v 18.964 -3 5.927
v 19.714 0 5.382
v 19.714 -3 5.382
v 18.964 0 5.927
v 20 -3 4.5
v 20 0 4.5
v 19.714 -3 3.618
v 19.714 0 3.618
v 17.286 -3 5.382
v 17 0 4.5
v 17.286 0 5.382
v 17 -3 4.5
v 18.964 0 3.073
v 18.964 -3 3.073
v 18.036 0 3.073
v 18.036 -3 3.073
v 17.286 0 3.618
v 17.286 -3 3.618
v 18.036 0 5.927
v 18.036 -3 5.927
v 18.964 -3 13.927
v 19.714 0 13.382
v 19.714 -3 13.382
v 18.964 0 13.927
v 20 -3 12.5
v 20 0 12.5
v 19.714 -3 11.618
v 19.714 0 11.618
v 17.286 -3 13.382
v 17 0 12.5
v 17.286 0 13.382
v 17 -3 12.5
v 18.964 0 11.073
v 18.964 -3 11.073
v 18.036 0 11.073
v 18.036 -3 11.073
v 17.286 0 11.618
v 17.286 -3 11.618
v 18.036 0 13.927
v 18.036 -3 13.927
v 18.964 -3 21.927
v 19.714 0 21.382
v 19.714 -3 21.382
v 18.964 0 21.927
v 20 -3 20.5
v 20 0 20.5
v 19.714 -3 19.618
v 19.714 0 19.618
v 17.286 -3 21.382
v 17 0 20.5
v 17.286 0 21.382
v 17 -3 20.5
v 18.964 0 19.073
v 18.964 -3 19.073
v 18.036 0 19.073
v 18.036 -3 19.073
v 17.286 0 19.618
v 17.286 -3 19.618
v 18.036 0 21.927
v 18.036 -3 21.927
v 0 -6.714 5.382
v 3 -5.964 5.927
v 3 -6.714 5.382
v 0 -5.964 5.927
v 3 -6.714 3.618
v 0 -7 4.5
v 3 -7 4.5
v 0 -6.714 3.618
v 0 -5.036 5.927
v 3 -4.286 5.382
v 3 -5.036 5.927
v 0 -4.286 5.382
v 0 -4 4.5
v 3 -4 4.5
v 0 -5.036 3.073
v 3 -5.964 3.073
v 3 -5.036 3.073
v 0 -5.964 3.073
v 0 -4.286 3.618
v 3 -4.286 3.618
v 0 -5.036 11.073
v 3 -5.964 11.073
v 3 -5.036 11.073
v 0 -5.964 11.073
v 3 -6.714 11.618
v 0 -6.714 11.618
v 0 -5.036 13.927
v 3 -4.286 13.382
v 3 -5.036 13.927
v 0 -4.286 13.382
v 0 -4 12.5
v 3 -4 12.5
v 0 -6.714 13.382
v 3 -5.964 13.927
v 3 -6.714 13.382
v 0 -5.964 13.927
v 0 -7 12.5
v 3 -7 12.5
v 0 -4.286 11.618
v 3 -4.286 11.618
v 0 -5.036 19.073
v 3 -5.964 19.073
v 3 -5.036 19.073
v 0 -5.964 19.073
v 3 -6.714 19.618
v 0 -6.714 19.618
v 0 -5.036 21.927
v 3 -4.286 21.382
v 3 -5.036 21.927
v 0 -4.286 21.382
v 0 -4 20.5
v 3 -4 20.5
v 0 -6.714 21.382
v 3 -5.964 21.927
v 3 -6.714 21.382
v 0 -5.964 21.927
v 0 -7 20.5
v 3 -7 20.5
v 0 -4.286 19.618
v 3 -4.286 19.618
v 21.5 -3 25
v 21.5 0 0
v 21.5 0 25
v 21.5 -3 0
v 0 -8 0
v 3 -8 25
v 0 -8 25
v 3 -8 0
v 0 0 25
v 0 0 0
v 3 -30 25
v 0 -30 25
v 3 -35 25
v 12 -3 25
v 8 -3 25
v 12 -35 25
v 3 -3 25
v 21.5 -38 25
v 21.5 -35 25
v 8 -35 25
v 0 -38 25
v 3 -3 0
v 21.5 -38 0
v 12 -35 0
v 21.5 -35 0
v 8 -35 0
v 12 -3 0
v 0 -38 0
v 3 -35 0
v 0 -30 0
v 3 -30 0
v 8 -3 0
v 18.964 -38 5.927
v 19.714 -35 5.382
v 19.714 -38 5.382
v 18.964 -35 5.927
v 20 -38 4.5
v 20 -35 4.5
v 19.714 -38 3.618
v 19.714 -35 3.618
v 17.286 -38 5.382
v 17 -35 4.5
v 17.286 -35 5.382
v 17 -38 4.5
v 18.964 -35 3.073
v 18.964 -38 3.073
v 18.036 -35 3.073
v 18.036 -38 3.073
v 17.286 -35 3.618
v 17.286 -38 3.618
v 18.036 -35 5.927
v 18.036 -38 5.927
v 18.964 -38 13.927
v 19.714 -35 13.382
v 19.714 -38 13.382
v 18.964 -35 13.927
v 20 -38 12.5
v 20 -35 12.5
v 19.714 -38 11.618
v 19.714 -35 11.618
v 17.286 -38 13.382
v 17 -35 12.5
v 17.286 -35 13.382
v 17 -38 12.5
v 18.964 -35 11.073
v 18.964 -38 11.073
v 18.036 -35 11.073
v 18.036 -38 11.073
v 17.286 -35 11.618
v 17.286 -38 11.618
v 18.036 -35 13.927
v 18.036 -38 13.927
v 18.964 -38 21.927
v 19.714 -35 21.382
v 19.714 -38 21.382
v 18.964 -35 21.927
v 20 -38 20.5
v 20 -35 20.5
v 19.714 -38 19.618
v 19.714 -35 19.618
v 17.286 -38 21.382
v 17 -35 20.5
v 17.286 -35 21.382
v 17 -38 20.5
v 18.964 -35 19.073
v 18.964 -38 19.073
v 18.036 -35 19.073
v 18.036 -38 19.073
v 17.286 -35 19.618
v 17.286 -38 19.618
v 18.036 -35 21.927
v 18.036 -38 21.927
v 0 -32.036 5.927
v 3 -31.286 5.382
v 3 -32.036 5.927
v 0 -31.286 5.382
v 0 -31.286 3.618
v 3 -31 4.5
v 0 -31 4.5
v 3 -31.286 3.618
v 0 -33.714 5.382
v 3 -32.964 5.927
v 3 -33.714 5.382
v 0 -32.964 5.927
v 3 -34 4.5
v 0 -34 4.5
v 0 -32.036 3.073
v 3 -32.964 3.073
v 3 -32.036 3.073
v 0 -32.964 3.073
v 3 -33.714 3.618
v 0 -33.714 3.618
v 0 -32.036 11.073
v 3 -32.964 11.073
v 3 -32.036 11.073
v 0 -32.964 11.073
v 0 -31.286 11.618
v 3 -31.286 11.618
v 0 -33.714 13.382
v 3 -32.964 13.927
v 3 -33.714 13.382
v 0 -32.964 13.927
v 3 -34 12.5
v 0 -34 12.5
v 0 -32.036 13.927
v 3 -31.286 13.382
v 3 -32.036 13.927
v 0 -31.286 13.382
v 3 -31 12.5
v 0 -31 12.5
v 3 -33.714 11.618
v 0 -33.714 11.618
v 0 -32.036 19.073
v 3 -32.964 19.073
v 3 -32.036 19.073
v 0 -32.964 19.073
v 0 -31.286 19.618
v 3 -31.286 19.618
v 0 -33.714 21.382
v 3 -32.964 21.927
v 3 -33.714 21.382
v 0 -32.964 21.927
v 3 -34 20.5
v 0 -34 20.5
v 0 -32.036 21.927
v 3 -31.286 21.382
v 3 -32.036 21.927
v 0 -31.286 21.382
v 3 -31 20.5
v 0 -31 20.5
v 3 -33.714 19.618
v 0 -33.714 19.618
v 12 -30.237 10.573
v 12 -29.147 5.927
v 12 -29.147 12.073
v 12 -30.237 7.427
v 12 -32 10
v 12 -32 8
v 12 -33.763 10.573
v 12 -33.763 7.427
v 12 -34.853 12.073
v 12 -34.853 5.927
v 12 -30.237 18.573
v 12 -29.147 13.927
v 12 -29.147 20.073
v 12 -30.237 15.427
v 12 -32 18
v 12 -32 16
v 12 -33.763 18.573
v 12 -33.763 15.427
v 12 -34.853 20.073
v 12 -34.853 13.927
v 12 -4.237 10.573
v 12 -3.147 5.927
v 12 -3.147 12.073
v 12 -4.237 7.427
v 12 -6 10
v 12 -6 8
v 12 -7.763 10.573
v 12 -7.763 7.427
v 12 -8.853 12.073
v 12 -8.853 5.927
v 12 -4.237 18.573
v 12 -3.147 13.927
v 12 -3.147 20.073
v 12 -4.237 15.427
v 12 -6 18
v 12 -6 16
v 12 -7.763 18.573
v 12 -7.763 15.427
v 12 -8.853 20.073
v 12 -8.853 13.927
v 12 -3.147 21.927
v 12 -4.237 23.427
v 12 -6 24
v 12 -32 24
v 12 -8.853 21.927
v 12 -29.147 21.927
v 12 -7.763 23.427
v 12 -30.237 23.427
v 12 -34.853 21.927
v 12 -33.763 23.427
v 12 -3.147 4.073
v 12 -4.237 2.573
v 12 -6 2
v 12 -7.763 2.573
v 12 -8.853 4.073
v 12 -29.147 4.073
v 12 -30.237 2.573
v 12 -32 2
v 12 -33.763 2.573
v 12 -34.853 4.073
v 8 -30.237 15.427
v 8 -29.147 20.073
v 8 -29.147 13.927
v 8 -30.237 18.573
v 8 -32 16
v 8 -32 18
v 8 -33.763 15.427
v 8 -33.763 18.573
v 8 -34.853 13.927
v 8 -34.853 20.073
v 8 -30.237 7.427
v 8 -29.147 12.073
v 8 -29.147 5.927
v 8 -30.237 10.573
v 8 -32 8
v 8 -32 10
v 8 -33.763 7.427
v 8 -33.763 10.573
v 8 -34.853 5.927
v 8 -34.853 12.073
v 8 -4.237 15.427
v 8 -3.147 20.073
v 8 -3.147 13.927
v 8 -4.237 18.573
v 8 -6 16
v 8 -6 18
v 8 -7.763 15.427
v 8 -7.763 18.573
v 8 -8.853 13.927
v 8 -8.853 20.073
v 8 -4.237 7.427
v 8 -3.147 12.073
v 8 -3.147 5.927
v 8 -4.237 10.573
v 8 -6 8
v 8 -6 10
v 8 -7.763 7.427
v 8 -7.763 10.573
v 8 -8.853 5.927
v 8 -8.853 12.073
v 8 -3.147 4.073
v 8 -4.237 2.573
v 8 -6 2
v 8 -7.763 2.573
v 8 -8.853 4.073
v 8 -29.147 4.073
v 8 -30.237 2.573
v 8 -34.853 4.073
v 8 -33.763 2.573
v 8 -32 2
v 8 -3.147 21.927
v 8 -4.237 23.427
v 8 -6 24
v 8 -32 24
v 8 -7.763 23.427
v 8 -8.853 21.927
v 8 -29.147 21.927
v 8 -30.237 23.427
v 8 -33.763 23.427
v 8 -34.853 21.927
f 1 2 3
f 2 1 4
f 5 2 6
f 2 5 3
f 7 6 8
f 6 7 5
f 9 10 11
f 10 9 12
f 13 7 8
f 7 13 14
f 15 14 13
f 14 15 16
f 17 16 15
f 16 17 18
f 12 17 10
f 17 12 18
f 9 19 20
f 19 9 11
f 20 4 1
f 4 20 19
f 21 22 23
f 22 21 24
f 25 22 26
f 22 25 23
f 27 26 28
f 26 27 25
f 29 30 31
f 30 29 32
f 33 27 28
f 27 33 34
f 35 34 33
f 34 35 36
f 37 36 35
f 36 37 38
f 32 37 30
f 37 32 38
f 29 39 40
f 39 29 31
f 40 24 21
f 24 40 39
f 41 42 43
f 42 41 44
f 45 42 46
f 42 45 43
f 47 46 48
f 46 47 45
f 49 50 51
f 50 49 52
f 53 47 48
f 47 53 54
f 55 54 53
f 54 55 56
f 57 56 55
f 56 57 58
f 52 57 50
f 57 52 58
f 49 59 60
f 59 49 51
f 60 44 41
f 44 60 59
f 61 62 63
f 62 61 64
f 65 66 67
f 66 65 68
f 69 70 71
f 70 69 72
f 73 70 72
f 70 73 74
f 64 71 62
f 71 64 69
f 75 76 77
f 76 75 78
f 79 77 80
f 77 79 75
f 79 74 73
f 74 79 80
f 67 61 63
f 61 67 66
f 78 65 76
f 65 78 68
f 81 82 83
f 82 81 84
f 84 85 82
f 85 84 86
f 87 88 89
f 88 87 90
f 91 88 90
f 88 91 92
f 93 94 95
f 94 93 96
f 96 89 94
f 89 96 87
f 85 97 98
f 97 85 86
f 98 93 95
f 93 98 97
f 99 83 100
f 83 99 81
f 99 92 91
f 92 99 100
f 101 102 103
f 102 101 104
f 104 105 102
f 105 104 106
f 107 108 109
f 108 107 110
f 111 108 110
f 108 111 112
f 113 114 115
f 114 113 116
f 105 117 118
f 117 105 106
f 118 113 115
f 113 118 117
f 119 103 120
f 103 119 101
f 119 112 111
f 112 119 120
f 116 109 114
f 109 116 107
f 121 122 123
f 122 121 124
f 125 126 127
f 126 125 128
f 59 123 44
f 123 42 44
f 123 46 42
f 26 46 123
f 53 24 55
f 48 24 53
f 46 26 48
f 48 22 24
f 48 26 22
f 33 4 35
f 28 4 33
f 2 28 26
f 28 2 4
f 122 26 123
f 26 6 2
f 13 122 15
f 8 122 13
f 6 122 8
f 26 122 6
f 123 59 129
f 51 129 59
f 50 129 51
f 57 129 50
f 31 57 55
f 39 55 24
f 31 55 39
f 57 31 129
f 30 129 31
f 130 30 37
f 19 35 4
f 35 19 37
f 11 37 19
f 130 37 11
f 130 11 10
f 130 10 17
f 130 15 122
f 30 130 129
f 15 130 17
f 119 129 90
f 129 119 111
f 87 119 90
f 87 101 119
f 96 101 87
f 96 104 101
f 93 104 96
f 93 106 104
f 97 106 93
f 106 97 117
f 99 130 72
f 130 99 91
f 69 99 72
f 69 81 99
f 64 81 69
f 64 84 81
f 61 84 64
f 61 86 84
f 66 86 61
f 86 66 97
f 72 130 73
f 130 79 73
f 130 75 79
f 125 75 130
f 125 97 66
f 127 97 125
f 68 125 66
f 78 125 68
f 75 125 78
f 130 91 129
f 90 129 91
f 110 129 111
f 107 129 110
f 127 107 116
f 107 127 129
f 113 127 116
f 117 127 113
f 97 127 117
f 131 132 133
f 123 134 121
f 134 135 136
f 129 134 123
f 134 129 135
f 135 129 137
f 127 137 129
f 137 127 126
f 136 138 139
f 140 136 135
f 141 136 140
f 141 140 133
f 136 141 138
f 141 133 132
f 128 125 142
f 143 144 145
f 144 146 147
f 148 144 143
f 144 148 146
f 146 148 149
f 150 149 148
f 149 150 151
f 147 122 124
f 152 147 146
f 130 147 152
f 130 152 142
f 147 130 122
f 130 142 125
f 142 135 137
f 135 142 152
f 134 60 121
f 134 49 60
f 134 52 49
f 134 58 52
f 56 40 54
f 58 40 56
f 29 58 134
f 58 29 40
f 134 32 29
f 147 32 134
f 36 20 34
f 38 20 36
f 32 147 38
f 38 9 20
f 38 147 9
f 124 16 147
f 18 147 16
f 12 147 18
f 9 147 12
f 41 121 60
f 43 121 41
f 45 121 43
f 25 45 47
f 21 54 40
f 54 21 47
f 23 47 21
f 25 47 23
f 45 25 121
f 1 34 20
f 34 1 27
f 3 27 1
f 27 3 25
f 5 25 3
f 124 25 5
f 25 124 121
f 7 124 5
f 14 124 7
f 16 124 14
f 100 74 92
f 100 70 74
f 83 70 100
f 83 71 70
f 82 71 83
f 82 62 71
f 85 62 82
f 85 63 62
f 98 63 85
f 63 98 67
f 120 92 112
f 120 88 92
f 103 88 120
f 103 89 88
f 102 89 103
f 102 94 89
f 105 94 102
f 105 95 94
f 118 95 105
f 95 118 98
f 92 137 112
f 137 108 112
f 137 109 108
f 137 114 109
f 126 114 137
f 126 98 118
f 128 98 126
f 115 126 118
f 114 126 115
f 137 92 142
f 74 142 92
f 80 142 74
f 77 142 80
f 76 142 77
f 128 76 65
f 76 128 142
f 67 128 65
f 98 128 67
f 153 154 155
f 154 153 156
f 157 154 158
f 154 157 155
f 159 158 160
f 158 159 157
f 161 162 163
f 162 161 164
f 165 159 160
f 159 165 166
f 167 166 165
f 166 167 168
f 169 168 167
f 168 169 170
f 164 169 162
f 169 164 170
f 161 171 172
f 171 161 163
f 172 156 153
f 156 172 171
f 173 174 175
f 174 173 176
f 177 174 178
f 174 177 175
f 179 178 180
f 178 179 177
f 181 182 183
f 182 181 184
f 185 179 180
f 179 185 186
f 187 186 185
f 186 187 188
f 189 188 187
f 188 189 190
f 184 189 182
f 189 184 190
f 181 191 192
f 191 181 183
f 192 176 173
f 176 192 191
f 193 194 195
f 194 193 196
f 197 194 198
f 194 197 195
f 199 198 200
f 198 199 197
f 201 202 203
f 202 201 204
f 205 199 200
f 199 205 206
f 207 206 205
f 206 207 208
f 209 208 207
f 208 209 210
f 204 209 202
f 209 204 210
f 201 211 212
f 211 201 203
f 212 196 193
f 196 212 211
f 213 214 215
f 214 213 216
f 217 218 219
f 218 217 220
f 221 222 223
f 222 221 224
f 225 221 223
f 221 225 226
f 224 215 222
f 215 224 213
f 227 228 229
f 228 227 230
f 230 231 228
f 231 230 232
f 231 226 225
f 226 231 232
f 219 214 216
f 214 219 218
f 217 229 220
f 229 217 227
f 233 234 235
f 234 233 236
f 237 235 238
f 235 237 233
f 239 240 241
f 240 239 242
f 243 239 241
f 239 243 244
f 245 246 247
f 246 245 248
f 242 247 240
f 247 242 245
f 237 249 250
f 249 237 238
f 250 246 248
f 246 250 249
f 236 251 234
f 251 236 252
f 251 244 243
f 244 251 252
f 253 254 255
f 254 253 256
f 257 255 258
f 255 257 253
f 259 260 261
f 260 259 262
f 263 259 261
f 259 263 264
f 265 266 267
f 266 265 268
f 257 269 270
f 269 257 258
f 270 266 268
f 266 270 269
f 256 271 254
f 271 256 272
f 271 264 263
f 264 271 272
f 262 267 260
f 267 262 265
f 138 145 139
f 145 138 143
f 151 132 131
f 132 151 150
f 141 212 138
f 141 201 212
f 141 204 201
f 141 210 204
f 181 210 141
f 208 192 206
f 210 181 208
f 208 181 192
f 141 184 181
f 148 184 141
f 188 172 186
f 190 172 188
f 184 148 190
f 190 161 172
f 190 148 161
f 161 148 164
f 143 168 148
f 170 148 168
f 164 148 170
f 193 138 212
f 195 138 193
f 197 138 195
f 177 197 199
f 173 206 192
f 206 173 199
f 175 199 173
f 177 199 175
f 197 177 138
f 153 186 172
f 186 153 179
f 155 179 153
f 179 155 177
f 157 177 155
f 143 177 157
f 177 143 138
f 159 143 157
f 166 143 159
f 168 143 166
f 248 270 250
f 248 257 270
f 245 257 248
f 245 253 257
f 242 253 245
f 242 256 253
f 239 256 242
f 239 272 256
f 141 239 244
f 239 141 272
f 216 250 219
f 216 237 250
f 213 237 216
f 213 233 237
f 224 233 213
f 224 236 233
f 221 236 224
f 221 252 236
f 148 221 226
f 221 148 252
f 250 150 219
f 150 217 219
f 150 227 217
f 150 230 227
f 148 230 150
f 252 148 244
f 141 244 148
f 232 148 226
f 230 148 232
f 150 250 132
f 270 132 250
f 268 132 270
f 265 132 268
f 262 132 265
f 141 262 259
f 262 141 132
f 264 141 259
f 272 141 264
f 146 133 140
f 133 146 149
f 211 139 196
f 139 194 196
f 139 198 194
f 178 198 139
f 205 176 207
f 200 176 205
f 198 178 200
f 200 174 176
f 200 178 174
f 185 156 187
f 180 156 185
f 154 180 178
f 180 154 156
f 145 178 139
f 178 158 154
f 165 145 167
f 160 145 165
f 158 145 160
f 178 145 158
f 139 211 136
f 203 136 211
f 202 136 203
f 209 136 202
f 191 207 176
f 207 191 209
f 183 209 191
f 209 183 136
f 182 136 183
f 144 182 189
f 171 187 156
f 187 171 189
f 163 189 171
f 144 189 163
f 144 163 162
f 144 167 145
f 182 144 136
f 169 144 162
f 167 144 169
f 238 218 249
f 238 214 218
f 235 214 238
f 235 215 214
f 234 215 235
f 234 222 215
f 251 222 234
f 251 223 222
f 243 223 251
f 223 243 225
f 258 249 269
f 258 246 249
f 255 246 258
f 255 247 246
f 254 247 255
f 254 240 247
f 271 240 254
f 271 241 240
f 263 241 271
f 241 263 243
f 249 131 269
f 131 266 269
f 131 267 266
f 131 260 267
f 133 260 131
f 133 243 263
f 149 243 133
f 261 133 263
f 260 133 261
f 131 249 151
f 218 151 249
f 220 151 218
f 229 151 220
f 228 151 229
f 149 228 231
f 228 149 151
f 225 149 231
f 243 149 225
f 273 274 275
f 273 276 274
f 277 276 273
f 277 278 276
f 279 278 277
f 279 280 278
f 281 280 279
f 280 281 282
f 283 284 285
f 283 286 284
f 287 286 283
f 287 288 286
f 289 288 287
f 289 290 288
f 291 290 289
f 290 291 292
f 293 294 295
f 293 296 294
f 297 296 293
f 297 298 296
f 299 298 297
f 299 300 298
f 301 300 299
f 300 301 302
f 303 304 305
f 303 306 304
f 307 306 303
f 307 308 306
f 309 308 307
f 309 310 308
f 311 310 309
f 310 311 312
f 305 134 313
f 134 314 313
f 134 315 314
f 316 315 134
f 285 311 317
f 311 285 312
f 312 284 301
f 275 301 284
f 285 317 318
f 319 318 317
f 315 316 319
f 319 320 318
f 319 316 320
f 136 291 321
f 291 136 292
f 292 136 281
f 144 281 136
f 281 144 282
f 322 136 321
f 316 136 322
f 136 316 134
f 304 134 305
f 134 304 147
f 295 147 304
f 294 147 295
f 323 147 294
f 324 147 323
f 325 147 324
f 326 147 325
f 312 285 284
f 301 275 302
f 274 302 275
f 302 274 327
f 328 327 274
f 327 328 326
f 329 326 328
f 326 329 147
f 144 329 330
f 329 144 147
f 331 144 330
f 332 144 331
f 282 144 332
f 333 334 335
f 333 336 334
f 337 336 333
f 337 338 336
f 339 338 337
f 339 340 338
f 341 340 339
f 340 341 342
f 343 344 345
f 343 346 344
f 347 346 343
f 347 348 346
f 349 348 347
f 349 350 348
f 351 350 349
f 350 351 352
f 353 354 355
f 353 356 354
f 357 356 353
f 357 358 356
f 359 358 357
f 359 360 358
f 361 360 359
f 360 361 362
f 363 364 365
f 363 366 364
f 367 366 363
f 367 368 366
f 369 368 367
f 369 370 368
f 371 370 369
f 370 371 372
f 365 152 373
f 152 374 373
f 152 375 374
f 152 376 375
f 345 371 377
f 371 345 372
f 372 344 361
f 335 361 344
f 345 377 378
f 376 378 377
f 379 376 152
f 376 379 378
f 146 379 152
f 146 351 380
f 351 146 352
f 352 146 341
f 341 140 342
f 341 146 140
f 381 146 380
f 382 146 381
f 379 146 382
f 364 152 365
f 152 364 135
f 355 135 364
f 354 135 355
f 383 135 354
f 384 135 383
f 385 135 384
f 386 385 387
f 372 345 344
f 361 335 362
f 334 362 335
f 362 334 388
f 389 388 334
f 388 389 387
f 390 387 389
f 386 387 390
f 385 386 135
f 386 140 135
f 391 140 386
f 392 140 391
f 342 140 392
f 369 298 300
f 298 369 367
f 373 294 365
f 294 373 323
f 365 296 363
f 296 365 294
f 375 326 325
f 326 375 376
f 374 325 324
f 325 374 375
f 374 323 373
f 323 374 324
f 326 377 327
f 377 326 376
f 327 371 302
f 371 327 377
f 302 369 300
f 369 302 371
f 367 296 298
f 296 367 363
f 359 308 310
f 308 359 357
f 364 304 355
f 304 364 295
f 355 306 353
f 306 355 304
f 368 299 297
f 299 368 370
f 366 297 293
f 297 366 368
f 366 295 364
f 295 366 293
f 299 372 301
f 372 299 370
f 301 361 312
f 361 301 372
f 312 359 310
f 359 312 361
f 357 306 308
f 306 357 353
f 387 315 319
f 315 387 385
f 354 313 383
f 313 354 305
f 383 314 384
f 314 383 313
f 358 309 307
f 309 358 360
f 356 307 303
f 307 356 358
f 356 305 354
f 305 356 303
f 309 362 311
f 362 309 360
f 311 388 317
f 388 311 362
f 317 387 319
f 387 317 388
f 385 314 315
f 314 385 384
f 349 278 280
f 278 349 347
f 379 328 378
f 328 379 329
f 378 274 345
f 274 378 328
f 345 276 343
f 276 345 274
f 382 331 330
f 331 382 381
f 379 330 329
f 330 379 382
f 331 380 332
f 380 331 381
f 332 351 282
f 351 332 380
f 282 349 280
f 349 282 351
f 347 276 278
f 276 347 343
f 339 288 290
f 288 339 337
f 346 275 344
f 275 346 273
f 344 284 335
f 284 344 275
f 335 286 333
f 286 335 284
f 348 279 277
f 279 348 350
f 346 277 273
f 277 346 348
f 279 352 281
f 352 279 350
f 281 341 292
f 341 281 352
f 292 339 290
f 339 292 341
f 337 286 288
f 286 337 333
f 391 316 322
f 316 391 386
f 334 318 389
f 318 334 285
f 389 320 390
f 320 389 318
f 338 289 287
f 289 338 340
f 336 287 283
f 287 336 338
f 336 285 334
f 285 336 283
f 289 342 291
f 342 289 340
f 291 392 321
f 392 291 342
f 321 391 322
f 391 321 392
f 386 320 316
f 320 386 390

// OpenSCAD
module agujereado(x,y){
	union(){
		for(j=[0:y-1])
		{
			translate([0,j*8,0])
			{
				for(i=[0:x-1])
				{
					translate([8*i,0,-1])cylinder(r=1.5, h=30, $fn=10);
				}
			}
		}
	}
}


module lateral(){
	rotate([90,0,0]) difference(){
		cube([21.5,25,8]);
		translate([3,0,3]) cube([24,25,9]);
		translate([10.5,4.5,0]) agujereado(2,3);
		translate([0,4.5,5.5]) rotate([0,90,0]) agujereado(1,3);
	}
}

difference(){
	union(){
		lateral();
		translate([0,-(11+27),0]) mirror([0,1,0]) lateral();
		translate([8,-38,0]) cube([4,38,25]);
	}
	translate([5,-6,5]) rotate([0,90,0]) cylinder(r=3,h=20);
	translate([5,-6,13]) rotate([0,90,0]) cylinder(r=3,h=20);
	translate([5,-6,21]) rotate([0,90,0]) cylinder(r=3,h=20);
	translate([5,-32,5]) rotate([0,90,0]) cylinder(r=3,h=20);
	translate([5,-32,13]) rotate([0,90,0]) cylinder(r=3,h=20);
	translate([5,-32,21]) rotate([0,90,0]) cylinder(r=3,h=20);
}
